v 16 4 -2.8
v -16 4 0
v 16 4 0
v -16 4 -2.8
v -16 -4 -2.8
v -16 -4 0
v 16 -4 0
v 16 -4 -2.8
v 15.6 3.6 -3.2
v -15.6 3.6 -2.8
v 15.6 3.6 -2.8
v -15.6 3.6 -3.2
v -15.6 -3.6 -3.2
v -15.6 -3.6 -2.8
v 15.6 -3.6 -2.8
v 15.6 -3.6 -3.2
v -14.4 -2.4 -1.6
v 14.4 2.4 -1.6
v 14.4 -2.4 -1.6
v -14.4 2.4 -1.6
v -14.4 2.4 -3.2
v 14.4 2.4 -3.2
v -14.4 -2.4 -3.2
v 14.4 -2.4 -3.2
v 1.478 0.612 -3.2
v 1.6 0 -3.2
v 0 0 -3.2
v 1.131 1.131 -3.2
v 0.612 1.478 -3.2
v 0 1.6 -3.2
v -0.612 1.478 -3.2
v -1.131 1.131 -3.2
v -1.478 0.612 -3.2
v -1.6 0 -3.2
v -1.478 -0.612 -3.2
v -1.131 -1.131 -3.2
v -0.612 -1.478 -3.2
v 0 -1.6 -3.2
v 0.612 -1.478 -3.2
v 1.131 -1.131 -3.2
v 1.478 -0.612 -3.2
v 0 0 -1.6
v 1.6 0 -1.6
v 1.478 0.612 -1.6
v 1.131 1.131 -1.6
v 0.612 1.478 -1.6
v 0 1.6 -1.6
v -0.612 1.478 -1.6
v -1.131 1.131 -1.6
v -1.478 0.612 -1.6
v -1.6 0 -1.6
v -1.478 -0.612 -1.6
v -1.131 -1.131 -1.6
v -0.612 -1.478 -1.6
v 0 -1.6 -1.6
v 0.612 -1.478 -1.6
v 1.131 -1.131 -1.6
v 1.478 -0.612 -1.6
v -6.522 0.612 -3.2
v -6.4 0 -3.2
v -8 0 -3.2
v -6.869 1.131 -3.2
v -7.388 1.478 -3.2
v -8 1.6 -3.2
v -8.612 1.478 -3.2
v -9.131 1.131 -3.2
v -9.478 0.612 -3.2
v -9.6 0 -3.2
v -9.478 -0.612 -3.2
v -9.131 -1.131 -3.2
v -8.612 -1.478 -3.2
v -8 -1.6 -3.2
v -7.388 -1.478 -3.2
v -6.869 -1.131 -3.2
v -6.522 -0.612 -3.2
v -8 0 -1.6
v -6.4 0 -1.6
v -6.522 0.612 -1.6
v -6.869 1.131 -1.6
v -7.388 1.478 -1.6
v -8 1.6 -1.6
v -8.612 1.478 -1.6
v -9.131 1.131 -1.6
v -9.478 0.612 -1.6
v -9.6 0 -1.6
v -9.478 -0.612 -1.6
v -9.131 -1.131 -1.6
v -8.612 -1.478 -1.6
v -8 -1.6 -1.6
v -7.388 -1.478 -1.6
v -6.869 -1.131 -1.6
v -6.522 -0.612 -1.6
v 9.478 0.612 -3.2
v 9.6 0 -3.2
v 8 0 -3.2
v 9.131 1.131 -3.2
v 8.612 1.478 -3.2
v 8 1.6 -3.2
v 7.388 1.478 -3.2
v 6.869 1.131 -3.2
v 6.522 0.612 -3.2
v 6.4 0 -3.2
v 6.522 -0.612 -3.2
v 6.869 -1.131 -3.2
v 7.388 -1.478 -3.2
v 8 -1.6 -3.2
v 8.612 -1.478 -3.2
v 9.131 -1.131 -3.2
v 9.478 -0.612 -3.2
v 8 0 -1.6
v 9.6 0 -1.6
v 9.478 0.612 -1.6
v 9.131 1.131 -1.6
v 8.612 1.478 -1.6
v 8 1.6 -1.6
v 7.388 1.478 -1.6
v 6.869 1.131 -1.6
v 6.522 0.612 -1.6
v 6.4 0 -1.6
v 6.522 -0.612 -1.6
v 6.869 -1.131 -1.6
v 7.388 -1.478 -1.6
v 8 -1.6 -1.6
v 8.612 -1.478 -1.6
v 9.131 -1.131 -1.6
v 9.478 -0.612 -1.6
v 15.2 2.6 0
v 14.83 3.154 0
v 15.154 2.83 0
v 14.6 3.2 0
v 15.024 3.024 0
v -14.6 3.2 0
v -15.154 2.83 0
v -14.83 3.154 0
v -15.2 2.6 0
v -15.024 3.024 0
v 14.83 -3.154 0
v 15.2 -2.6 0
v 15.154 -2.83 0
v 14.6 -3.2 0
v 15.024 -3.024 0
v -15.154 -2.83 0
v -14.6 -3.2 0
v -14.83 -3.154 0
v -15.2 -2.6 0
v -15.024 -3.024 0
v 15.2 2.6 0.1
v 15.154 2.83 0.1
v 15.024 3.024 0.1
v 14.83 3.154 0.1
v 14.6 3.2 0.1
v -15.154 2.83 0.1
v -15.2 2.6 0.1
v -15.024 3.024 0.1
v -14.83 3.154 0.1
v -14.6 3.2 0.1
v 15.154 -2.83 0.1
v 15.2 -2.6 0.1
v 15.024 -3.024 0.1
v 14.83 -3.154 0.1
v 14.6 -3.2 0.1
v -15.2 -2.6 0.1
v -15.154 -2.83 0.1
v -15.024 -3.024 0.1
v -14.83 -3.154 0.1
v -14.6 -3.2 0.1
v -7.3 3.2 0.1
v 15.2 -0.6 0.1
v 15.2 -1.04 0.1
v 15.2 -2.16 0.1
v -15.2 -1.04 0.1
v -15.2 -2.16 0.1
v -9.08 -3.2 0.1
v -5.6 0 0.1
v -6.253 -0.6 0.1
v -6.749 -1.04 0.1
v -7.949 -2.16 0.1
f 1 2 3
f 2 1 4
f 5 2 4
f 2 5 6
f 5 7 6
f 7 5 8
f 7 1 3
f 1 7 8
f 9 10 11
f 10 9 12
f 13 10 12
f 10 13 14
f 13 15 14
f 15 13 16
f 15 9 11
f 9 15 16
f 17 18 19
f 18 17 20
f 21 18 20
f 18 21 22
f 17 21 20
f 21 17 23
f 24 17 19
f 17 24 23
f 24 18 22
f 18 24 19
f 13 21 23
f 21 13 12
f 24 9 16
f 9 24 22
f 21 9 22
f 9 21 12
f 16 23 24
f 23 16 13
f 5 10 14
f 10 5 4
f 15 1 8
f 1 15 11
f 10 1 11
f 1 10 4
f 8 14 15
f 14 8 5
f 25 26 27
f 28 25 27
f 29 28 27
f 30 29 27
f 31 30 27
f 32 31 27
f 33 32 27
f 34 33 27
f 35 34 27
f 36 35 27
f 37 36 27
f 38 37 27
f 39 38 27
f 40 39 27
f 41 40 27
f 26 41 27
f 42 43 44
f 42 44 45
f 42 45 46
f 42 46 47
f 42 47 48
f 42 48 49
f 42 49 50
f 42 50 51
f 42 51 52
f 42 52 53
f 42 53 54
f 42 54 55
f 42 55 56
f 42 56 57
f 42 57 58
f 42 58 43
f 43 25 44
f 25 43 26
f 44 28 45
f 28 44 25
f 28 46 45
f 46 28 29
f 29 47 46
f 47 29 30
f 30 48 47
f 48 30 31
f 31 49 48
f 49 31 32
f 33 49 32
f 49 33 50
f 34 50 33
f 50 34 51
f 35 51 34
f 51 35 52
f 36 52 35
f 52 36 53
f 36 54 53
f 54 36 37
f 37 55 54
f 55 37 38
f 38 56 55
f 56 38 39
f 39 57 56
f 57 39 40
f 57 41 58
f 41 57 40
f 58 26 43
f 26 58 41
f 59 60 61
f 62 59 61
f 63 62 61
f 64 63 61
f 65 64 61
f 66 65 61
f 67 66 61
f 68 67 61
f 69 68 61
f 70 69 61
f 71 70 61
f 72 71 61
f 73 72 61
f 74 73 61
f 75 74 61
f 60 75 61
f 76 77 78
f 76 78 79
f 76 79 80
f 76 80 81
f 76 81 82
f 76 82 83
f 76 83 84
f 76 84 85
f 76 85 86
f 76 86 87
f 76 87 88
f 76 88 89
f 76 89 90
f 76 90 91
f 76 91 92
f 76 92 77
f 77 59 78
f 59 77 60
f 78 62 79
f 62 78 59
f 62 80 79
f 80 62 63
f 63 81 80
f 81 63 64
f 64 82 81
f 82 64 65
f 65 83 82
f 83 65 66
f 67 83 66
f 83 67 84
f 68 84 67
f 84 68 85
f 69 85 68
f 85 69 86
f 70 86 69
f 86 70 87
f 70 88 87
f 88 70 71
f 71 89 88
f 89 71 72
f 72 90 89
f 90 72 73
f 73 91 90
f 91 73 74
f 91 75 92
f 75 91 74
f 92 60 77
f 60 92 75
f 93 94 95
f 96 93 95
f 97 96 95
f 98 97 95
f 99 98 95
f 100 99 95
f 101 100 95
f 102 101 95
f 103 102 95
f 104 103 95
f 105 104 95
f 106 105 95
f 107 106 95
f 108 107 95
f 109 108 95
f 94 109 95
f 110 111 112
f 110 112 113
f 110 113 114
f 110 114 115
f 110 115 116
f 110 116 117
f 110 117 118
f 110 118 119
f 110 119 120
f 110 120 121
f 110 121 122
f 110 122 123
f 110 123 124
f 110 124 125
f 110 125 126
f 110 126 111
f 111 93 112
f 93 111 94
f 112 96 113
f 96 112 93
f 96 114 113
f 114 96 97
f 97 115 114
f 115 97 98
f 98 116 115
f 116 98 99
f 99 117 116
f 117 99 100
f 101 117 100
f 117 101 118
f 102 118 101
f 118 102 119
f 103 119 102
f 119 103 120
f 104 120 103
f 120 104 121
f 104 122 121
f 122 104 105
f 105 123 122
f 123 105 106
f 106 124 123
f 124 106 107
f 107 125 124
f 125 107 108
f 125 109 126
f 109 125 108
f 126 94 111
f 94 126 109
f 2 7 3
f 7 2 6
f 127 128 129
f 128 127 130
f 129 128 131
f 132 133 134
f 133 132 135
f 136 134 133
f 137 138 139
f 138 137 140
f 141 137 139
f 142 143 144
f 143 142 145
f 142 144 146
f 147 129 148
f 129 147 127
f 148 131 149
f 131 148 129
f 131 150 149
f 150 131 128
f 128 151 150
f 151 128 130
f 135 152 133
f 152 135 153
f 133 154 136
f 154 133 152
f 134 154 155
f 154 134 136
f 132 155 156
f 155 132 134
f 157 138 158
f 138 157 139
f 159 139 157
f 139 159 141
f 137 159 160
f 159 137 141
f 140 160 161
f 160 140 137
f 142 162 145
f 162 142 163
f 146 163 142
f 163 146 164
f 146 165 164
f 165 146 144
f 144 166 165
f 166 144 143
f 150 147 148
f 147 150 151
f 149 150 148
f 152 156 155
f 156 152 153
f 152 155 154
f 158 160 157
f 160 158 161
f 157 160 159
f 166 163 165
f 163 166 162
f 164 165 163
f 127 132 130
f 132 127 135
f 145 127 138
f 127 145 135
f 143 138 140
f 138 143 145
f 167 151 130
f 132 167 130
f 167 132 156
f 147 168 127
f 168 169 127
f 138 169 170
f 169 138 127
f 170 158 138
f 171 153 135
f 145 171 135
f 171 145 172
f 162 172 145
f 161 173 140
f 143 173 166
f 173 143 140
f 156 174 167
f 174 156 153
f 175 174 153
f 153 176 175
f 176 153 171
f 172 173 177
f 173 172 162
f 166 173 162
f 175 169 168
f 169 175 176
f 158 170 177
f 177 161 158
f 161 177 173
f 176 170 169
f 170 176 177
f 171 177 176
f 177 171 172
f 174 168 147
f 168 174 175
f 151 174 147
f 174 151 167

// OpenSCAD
// file: ../p/4-4edge.scad
use <../lib.scad>
function ldraw_lib__4_4edge() = [
// 0 Circle 1.0
// 0 Name: 4-4edge.dat
// 0 Author: James Jessiman
// 0 !LDRAW_ORG Primitive UPDATE 2017-01
// 0 !LICENSE Licensed under CC BY 2.0 and CC BY 4.0 : see CAreadme.txt
// 
// 0 BFC CERTIFY CCW
  [0,"BFC","CERTIFY"],
  [0,"BFC","CCW"],
// 
// 0 !HISTORY 1998-12-15 [PTadmin] Official Update 1998-10
// 0 !HISTORY 2005-12-28 [PTadmin] Official Update 2005-01
// 0 !HISTORY 2007-06-24 [PTadmin] Header formatted for Contributor Agreement
// 0 !HISTORY 2008-07-01 [PTadmin] Official Update 2008-01
// 0 !HISTORY 2017-01-15 [Steffen] BFCed
// 0 !HISTORY 2017-12-30 [PTadmin] Official Update 2017-01
// 
// 
// 2 24 1 0 0 0.9239 0 0.3827
  [2,24,1,0,0,0.9239,0,0.3827],
// 2 24 0.9239 0 0.3827 0.7071 0 0.7071
  [2,24,0.9239,0,0.3827,0.7071,0,0.7071],
// 2 24 0.7071 0 0.7071 0.3827 0 0.9239
  [2,24,0.7071,0,0.7071,0.3827,0,0.9239],
// 2 24 0.3827 0 0.9239 0 0 1
  [2,24,0.3827,0,0.9239,0,0,1],
// 2 24 0 0 1 -0.3827 0 0.9239
  [2,24,0,0,1,-0.3827,0,0.9239],
// 2 24 -0.3827 0 0.9239 -0.7071 0 0.7071
  [2,24,-0.3827,0,0.9239,-0.7071,0,0.7071],
// 2 24 -0.7071 0 0.7071 -0.9239 0 0.3827
  [2,24,-0.7071,0,0.7071,-0.9239,0,0.3827],
// 2 24 -0.9239 0 0.3827 -1 0 -0
  [2,24,-0.9239,0,0.3827,-1,0,-0],
// 2 24 -1 0 -0 -0.9239 0 -0.3827
  [2,24,-1,0,-0,-0.9239,0,-0.3827],
// 2 24 -0.9239 0 -0.3827 -0.7071 0 -0.7071
  [2,24,-0.9239,0,-0.3827,-0.7071,0,-0.7071],
// 2 24 -0.7071 0 -0.7071 -0.3827 0 -0.9239
  [2,24,-0.7071,0,-0.7071,-0.3827,0,-0.9239],
// 2 24 -0.3827 0 -0.9239 0 0 -1
  [2,24,-0.3827,0,-0.9239,0,0,-1],
// 2 24 0 0 -1 0.3827 0 -0.9239
  [2,24,0,0,-1,0.3827,0,-0.9239],
// 2 24 0.3827 0 -0.9239 0.7071 0 -0.7071
  [2,24,0.3827,0,-0.9239,0.7071,0,-0.7071],
// 2 24 0.7071 0 -0.7071 0.9239 0 -0.3827
  [2,24,0.7071,0,-0.7071,0.9239,0,-0.3827],
// 2 24 0.9239 0 -0.3827 1 0 0
  [2,24,0.9239,0,-0.3827,1,0,0],
];
module ldraw_lib__4_4edge(step=0, col=false, unit=2/5, alt=false, line=0.2, solid=!$preview)
    makepoly(ldraw_lib__4_4edge(), step=step, col=col, unit=unit, alt=alt, line=line, solid=solid);
ldraw_lib__4_4edge(line=0.2);
// file: ../p/4-4disc.scad
use <../lib.scad>
function ldraw_lib__4_4disc() = [
// 0 Disc 1.0
// 0 Name: 4-4disc.dat
// 0 Author: James Jessiman
// 0 !LDRAW_ORG Primitive UPDATE 2002-02
// 0 !LICENSE Licensed under CC BY 2.0 and CC BY 4.0 : see CAreadme.txt
// 
// 0 BFC CERTIFY CCW
  [0,"BFC","CERTIFY"],
  [0,"BFC","CCW"],
// 
// 0 !HISTORY 1998-12-15 [PTadmin] Official Update 1998-10
// 0 !HISTORY 2002-03-23 [sbliss] Added BFC statement
// 0 !HISTORY 2002-04-25 [PTadmin] Official Update 2002-02
// 0 !HISTORY 2007-06-24 [PTadmin] Header formatted for Contributor Agreement
// 0 !HISTORY 2008-07-01 [PTadmin] Official Update 2008-01
// 
// 
// 3 16 0 0 0 1 0 0 0.9239 0 0.3827
  [3,16,0,0,0,1,0,0,0.9239,0,0.3827],
// 3 16 0 0 0 0.9239 0 0.3827 0.7071 0 0.7071
  [3,16,0,0,0,0.9239,0,0.3827,0.7071,0,0.7071],
// 3 16 0 0 0 0.7071 0 0.7071 0.3827 0 0.9239
  [3,16,0,0,0,0.7071,0,0.7071,0.3827,0,0.9239],
// 3 16 0 0 0 0.3827 0 0.9239 0 0 1
  [3,16,0,0,0,0.3827,0,0.9239,0,0,1],
// 3 16 0 0 0 0 0 1 -0.3827 0 0.9239
  [3,16,0,0,0,0,0,1,-0.3827,0,0.9239],
// 3 16 0 0 0 -0.3827 0 0.9239 -0.7071 0 0.7071
  [3,16,0,0,0,-0.3827,0,0.9239,-0.7071,0,0.7071],
// 3 16 0 0 0 -0.7071 0 0.7071 -0.9239 0 0.3827
  [3,16,0,0,0,-0.7071,0,0.7071,-0.9239,0,0.3827],
// 3 16 0 0 0 -0.9239 0 0.3827 -1 0 -0
  [3,16,0,0,0,-0.9239,0,0.3827,-1,0,-0],
// 3 16 0 0 0 -1 0 -0 -0.9239 0 -0.3827
  [3,16,0,0,0,-1,0,-0,-0.9239,0,-0.3827],
// 3 16 0 0 0 -0.9239 0 -0.3827 -0.7071 0 -0.7071
  [3,16,0,0,0,-0.9239,0,-0.3827,-0.7071,0,-0.7071],
// 3 16 0 0 0 -0.7071 0 -0.7071 -0.3827 0 -0.9239
  [3,16,0,0,0,-0.7071,0,-0.7071,-0.3827,0,-0.9239],
// 3 16 0 0 0 -0.3827 0 -0.9239 0 0 -1
  [3,16,0,0,0,-0.3827,0,-0.9239,0,0,-1],
// 3 16 0 0 0 0 0 -1 0.3827 0 -0.9239
  [3,16,0,0,0,0,0,-1,0.3827,0,-0.9239],
// 3 16 0 0 0 0.3827 0 -0.9239 0.7071 0 -0.7071
  [3,16,0,0,0,0.3827,0,-0.9239,0.7071,0,-0.7071],
// 3 16 0 0 0 0.7071 0 -0.7071 0.9239 0 -0.3827
  [3,16,0,0,0,0.7071,0,-0.7071,0.9239,0,-0.3827],
// 3 16 0 0 0 0.9239 0 -0.3827 1 0 0
  [3,16,0,0,0,0.9239,0,-0.3827,1,0,0],
// 0
];
module ldraw_lib__4_4disc(step=0, col=false, unit=2/5, alt=false, line=0.2, solid=!$preview)
    makepoly(ldraw_lib__4_4disc(), step=step, col=col, unit=unit, alt=alt, line=line, solid=solid);
ldraw_lib__4_4disc(line=0.2);
// file: ../p/4-4cyli.scad
use <../lib.scad>
$fa=1; $fs=0.2;
function ldraw_lib__4_4cyli(realsolid=false) = [
// 0 Cylinder 1.0
// 0 Name: 4-4cyli.dat
// 0 Author: James Jessiman
// 0 !LDRAW_ORG Primitive UPDATE 2005-01
// 0 !LICENSE Licensed under CC BY 2.0 and CC BY 4.0 : see CAreadme.txt
// 
// 0 BFC CERTIFY CCW
  [0,"BFC","CERTIFY"],
  [0,"BFC","CCW"],
// 
// 0 !HISTORY 1998-12-15 [PTadmin] Official Update 1998-10
// 0 !HISTORY 2002-03-23 [sbliss] Added BFC statement; merged headers from files in distributions LDraw 0.27 and Complete.
// 0 !HISTORY 2002-04-25 [PTadmin] Official Update 2002-02
// 0 !HISTORY 2004-12-14 [guyvivan] BFC CCW
// 0 !HISTORY 2005-12-28 [PTadmin] Official Update 2005-01
// 0 !HISTORY 2007-06-24 [PTadmin] Header formatted for Contributor Agreement
// 0 !HISTORY 2008-07-01 [PTadmin] Official Update 2008-01
// 
// 
// 4 16 1 1 0 0.9239 1 0.3827 0.9239 0 0.3827 1 0 0
  [4,16,1,1,0,0.9239,1,0.3827,0.9239,0,0.3827,1,0,0],
// 5 24 1 0 0 1 1 0 0.9239 0 0.3827 0.9239 0 -0.3827
  [5,24,1,0,0,1,1,0,0.9239,0,0.3827,0.9239,0,-0.3827],
// 4 16 0.9239 1 0.3827 0.7071 1 0.7071 0.7071 0 0.7071 0.9239 0 0.3827
  [4,16,0.9239,1,0.3827,0.7071,1,0.7071,0.7071,0,0.7071,0.9239,0,0.3827],
// 5 24 0.9239 0 0.3827 0.9239 1 0.3827 0.7071 0 0.7071 1 0 0
  [5,24,0.9239,0,0.3827,0.9239,1,0.3827,0.7071,0,0.7071,1,0,0],
// 4 16 0.7071 1 0.7071 0.3827 1 0.9239 0.3827 0 0.9239 0.7071 0 0.7071
  [4,16,0.7071,1,0.7071,0.3827,1,0.9239,0.3827,0,0.9239,0.7071,0,0.7071],
// 5 24 0.7071 0 0.7071 0.7071 1 0.7071 0.3827 0 0.9239 0.9239 0 0.3827
  [5,24,0.7071,0,0.7071,0.7071,1,0.7071,0.3827,0,0.9239,0.9239,0,0.3827],
// 4 16 0.3827 1 0.9239 0 1 1 0 0 1 0.3827 0 0.9239
  [4,16,0.3827,1,0.9239,0,1,1,0,0,1,0.3827,0,0.9239],
// 5 24 0.3827 0 0.9239 0.3827 1 0.9239 0 0 1 0.7071 0 0.7071
  [5,24,0.3827,0,0.9239,0.3827,1,0.9239,0,0,1,0.7071,0,0.7071],
// 4 16 0 1 1 -0.3827 1 0.9239 -0.3827 0 0.9239 0 0 1
  [4,16,0,1,1,-0.3827,1,0.9239,-0.3827,0,0.9239,0,0,1],
// 5 24 0 0 1 0 1 1 -0.3827 0 0.9239 0.3827 0 0.9239
  [5,24,0,0,1,0,1,1,-0.3827,0,0.9239,0.3827,0,0.9239],
// 4 16 -0.3827 1 0.9239 -0.7071 1 0.7071 -0.7071 0 0.7071 -0.3827 0 0.9239
  [4,16,-0.3827,1,0.9239,-0.7071,1,0.7071,-0.7071,0,0.7071,-0.3827,0,0.9239],
// 5 24 -0.3827 0 0.9239 -0.3827 1 0.9239 -0.7071 0 0.7071 0 0 1
  [5,24,-0.3827,0,0.9239,-0.3827,1,0.9239,-0.7071,0,0.7071,0,0,1],
// 4 16 -0.7071 1 0.7071 -0.9239 1 0.3827 -0.9239 0 0.3827 -0.7071 0 0.7071
  [4,16,-0.7071,1,0.7071,-0.9239,1,0.3827,-0.9239,0,0.3827,-0.7071,0,0.7071],
// 5 24 -0.7071 0 0.7071 -0.7071 1 0.7071 -0.9239 0 0.3827 -0.3827 0 0.9239
  [5,24,-0.7071,0,0.7071,-0.7071,1,0.7071,-0.9239,0,0.3827,-0.3827,0,0.9239],
// 4 16 -0.9239 1 0.3827 -1 1 0 -1 0 0 -0.9239 0 0.3827
  [4,16,-0.9239,1,0.3827,-1,1,0,-1,0,0,-0.9239,0,0.3827],
// 5 24 -0.9239 0 0.3827 -0.9239 1 0.3827 -1 0 0 -0.7071 0 0.7071
  [5,24,-0.9239,0,0.3827,-0.9239,1,0.3827,-1,0,0,-0.7071,0,0.7071],
// 4 16 -1 1 0 -0.9239 1 -0.3827 -0.9239 0 -0.3827 -1 0 0
  [4,16,-1,1,0,-0.9239,1,-0.3827,-0.9239,0,-0.3827,-1,0,0],
// 5 24 -1 0 0 -1 1 0 -0.9239 0 -0.3827 -0.9239 0 0.3827
  [5,24,-1,0,0,-1,1,0,-0.9239,0,-0.3827,-0.9239,0,0.3827],
// 4 16 -0.9239 1 -0.3827 -0.7071 1 -0.7071 -0.7071 0 -0.7071 -0.9239 0 -0.3827
  [4,16,-0.9239,1,-0.3827,-0.7071,1,-0.7071,-0.7071,0,-0.7071,-0.9239,0,-0.3827],
// 5 24 -0.9239 0 -0.3827 -0.9239 1 -0.3827 -0.7071 0 -0.7071 -1 0 0
  [5,24,-0.9239,0,-0.3827,-0.9239,1,-0.3827,-0.7071,0,-0.7071,-1,0,0],
// 4 16 -0.7071 1 -0.7071 -0.3827 1 -0.9239 -0.3827 0 -0.9239 -0.7071 0 -0.7071
  [4,16,-0.7071,1,-0.7071,-0.3827,1,-0.9239,-0.3827,0,-0.9239,-0.7071,0,-0.7071],
// 5 24 -0.7071 0 -0.7071 -0.7071 1 -0.7071 -0.3827 0 -0.9239 -0.9239 0 -0.3827
  [5,24,-0.7071,0,-0.7071,-0.7071,1,-0.7071,-0.3827,0,-0.9239,-0.9239,0,-0.3827],
// 4 16 -0.3827 1 -0.9239 0 1 -1 0 0 -1 -0.3827 0 -0.9239
  [4,16,-0.3827,1,-0.9239,0,1,-1,0,0,-1,-0.3827,0,-0.9239],
// 5 24 -0.3827 0 -0.9239 -0.3827 1 -0.9239 0 0 -1 -0.7071 0 -0.7071
  [5,24,-0.3827,0,-0.9239,-0.3827,1,-0.9239,0,0,-1,-0.7071,0,-0.7071],
// 4 16 0 1 -1 0.3827 1 -0.9239 0.3827 0 -0.9239 0 0 -1
  [4,16,0,1,-1,0.3827,1,-0.9239,0.3827,0,-0.9239,0,0,-1],
// 5 24 0 0 -1 0 1 -1 0.3827 0 -0.9239 -0.3827 0 -0.9239
  [5,24,0,0,-1,0,1,-1,0.3827,0,-0.9239,-0.3827,0,-0.9239],
// 4 16 0.3827 1 -0.9239 0.7071 1 -0.7071 0.7071 0 -0.7071 0.3827 0 -0.9239
  [4,16,0.3827,1,-0.9239,0.7071,1,-0.7071,0.7071,0,-0.7071,0.3827,0,-0.9239],
// 5 24 0.3827 0 -0.9239 0.3827 1 -0.9239 0.7071 0 -0.7071 0 0 -1
  [5,24,0.3827,0,-0.9239,0.3827,1,-0.9239,0.7071,0,-0.7071,0,0,-1],
// 4 16 0.7071 1 -0.7071 0.9239 1 -0.3827 0.9239 0 -0.3827 0.7071 0 -0.7071
  [4,16,0.7071,1,-0.7071,0.9239,1,-0.3827,0.9239,0,-0.3827,0.7071,0,-0.7071],
// 5 24 0.7071 0 -0.7071 0.7071 1 -0.7071 0.9239 0 -0.3827 0.3827 0 -0.9239
  [5,24,0.7071,0,-0.7071,0.7071,1,-0.7071,0.9239,0,-0.3827,0.3827,0,-0.9239],
// 4 16 0.9239 1 -0.3827 1 1 0 1 0 0 0.9239 0 -0.3827
  [4,16,0.9239,1,-0.3827,1,1,0,1,0,0,0.9239,0,-0.3827],
// 5 24 0.9239 0 -0.3827 0.9239 1 -0.3827 1 0 0 0.7071 0 -0.7071
  [5,24,0.9239,0,-0.3827,0.9239,1,-0.3827,1,0,0,0.7071,0,-0.7071],
// 0
];
module ldraw_lib__4_4cyli(step=0, col=false, unit=2/5, alt=false, line=0.2, solid=!$preview)
    makepoly(ldraw_lib__4_4cyli(solid), step=step, col=col, unit=unit, alt=alt, line=line, solid=solid);
ldraw_lib__4_4cyli(line=0.2);
// file: ../p/1-4cyli.scad
use <../lib.scad>
function ldraw_lib__1_4cyli() = [
// 0 Cylinder 0.25
// 0 Name: 1-4cyli.dat
// 0 Author: James Jessiman
// 0 !LDRAW_ORG Primitive UPDATE 2012-01
// 0 !LICENSE Licensed under CC BY 2.0 and CC BY 4.0 : see CAreadme.txt
// 
// 0 BFC CERTIFY CCW
  [0,"BFC","CERTIFY"],
  [0,"BFC","CCW"],
// 
// 0 !HISTORY 2002-03-23 [sbliss] Added BFC statement.
// 0 !HISTORY 2002-04-25 [PTadmin] Official Update 2002-02
// 0 !HISTORY 2007-06-22 [PTadmin] Header formatted for Contributor Agreement
// 0 !HISTORY 2008-07-01 [PTadmin] Official Update 2008-01
// 0 !HISTORY 2012-02-16 [Philo] Changed to CCW
// 0 !HISTORY 2012-03-30 [PTadmin] Official Update 2012-01
// 
// 
// 4 16 1 1 0 0.9239 1 0.3827 0.9239 0 0.3827 1 0 0
  [4,16,1,1,0,0.9239,1,0.3827,0.9239,0,0.3827,1,0,0],
// 5 24 1 0 0 1 1 0 0.9239 0 0.3827 1 0 -1
  [5,24,1,0,0,1,1,0,0.9239,0,0.3827,1,0,-1],
// 4 16 0.9239 1 0.3827 0.7071 1 0.7071 0.7071 0 0.7071 0.9239 0 0.3827
  [4,16,0.9239,1,0.3827,0.7071,1,0.7071,0.7071,0,0.7071,0.9239,0,0.3827],
// 5 24 0.9239 0 0.3827 0.9239 1 0.3827 0.7071 0 0.7071 1 0 0
  [5,24,0.9239,0,0.3827,0.9239,1,0.3827,0.7071,0,0.7071,1,0,0],
// 4 16 0.7071 1 0.7071 0.3827 1 0.9239 0.3827 0 0.9239 0.7071 0 0.7071
  [4,16,0.7071,1,0.7071,0.3827,1,0.9239,0.3827,0,0.9239,0.7071,0,0.7071],
// 5 24 0.7071 0 0.7071 0.7071 1 0.7071 0.3827 0 0.9239 0.9239 0 0.3827
  [5,24,0.7071,0,0.7071,0.7071,1,0.7071,0.3827,0,0.9239,0.9239,0,0.3827],
// 4 16 0.3827 1 0.9239 0 1 1 0 0 1 0.3827 0 0.9239
  [4,16,0.3827,1,0.9239,0,1,1,0,0,1,0.3827,0,0.9239],
// 5 24 0.3827 0 0.9239 0.3827 1 0.9239 0 0 1 0.7071 0 0.7071
  [5,24,0.3827,0,0.9239,0.3827,1,0.9239,0,0,1,0.7071,0,0.7071],
// 5 24 0 0 1 0 1 1 0.3827 0 0.9239 -1 0 1
  [5,24,0,0,1,0,1,1,0.3827,0,0.9239,-1,0,1],
];
module ldraw_lib__1_4cyli(step=0, col=false, unit=2/5, alt=false, line=0.2, solid=!$preview)
    makepoly(ldraw_lib__1_4cyli(), step=step, col=col, unit=unit, alt=alt, line=line, solid=solid);
ldraw_lib__1_4cyli(line=0.2);
// file: ../p/1-4chrd.scad
use <../lib.scad>
$fa=1; $fs=0.2;
function ldraw_lib__1_4chrd(realsolid=false) = [
// 0 Chord 0.25
// 0 Name: 1-4chrd.dat
// 0 Author: Tony Hafner [hafhead]
// 0 !LDRAW_ORG Primitive UPDATE 2012-02
// 0 !LICENSE Licensed under CC BY 2.0 and CC BY 4.0 : see CAreadme.txt
// 
// 0 BFC CERTIFY CCW
  [0,"BFC","CERTIFY"],
  [0,"BFC","CCW"],
// 
// 0 !HISTORY 2004-04-22 [PTadmin] Official Update 2004-02
// 0 !HISTORY 2007-10-09 [PTadmin] Header formatted for Contributor Agreement
// 0 !HISTORY 2008-07-01 [PTadmin] Official Update 2008-01
// 0 !HISTORY 2012-08-02 [MMR1988] Re-creation with PrimGen2 and Rectifier
// 0 !HISTORY 2012-08-09 [PTadmin] Official Update 2012-02
// 
// 
// 4 16 0.9239 0 0.3827 0.3827 0 0.9239 0 0 1 1 0 0
  [4,16,0.9239,0,0.3827,0.3827,0,0.9239,0,0,1,1,0,0],
// 3 16 0.7071 0 0.7071 0.3827 0 0.9239 0.9239 0 0.3827
  [3,16,0.7071,0,0.7071,0.3827,0,0.9239,0.9239,0,0.3827],
];
module ldraw_lib__1_4chrd(step=0, col=false, unit=2/5, alt=false, line=0.2, solid=!$preview)
    makepoly(ldraw_lib__1_4chrd(solid), step=step, col=col, unit=unit, alt=alt, line=line, solid=solid);
ldraw_lib__1_4chrd(line=0.2);
// file: ../p/stud3.scad
use <../lib.scad>
use <4-4cyli.scad>
use <4-4disc.scad>
use <4-4edge.scad>
function ldraw_lib__stud3() = [
// 0 Stud Tube Solid
// 0 Name: stud3.dat
// 0 Author: James Jessiman
// 0 !LDRAW_ORG Primitive UPDATE 2012-01
// 0 !LICENSE Licensed under CC BY 4.0 : see CAreadme.txt
// 
// 0 BFC CERTIFY CCW
  [0,"BFC","CERTIFY"],
  [0,"BFC","CCW"],
// 
// 0 !HISTORY 2002-04-04 [sbliss] Modified for BFC compliance
// 0 !HISTORY 2002-04-25 [PTadmin] Official Update 2002-02
// 0 !HISTORY 2007-06-24 [PTadmin] Header formatted for Contributor Agreement
// 0 !HISTORY 2008-07-01 [PTadmin] Official Update 2008-01
// 0 !HISTORY 2012-02-16 [Philo] Changed to CCW
// 0 !HISTORY 2012-03-30 [PTadmin] Official Update 2012-01
// 
// 
// 1 16 0 -4 0 4 0 0 0 1 0 0 0 4 4-4edge.dat
  [1,16,0,-4,0,4,0,0,0,1,0,0,0,4, ldraw_lib__4_4edge()],
// 1 16 0 0 0 4 0 0 0 1 0 0 0 4 4-4edge.dat
  [1,16,0,0,0,4,0,0,0,1,0,0,0,4, ldraw_lib__4_4edge()],
// 1 16 0 -4 0 4 0 0 0 1 0 0 0 4 4-4disc.dat
  [1,16,0,-4,0,4,0,0,0,1,0,0,0,4, ldraw_lib__4_4disc()],
  [-1,16,0,0,0,4,0,0,0,-1,0,0,0,4, ldraw_lib__4_4disc()],
// 1 16 0 -4 0 4 0 0 0 4 0 0 0 4 4-4cyli.dat
  [1,16,0,-4,0,4,0,0,0,4,0,0,0,4, ldraw_lib__4_4cyli()],
];
module ldraw_lib__stud3(step=0, col=false, unit=2/5, alt=false, line=0.2, solid=!$preview)
    makepoly(ldraw_lib__stud3(), step=step, col=col, unit=unit, alt=alt, line=line, solid=solid);
ldraw_lib__stud3(line=0.2);
// file: ../p/box5.scad
use <../lib.scad>
function ldraw_lib__box5() = [
// 0 Box with 5 Faces and All Edges
// 0 Name: box5.dat
// 0 Author: James Jessiman
// 0 !LDRAW_ORG Primitive UPDATE 2012-01
// 0 !LICENSE Licensed under CC BY 2.0 and CC BY 4.0 : see CAreadme.txt
// 
// 0 BFC CERTIFY CCW
  [0,"BFC","CERTIFY"],
  [0,"BFC","CCW"],
// 
// 0 !HISTORY 2002-04-03 [sbliss] Modified for BFC compliance
// 0 !HISTORY 2002-04-25 [PTadmin] Official Update 2002-02
// 0 !HISTORY 2007-06-24 [PTadmin] Header formatted for Contributor Agreement
// 0 !HISTORY 2008-07-01 [PTadmin] Official Update 2008-01
// 0 !HISTORY 2012-02-16 [Philo] Changed to CCW
// 0 !HISTORY 2012-03-30 [PTadmin] Official Update 2012-01
// 
// 
// 2 24 1 1 1 -1 1 1
  [2,24,1,1,1,-1,1,1],
// 2 24 -1 1 1 -1 1 -1
  [2,24,-1,1,1,-1,1,-1],
// 2 24 -1 1 -1 1 1 -1
  [2,24,-1,1,-1,1,1,-1],
// 2 24 1 1 -1 1 1 1
  [2,24,1,1,-1,1,1,1],
// 2 24 1 0 1 -1 0 1
  [2,24,1,0,1,-1,0,1],
// 2 24 -1 0 1 -1 0 -1
  [2,24,-1,0,1,-1,0,-1],
// 2 24 -1 0 -1 1 0 -1
  [2,24,-1,0,-1,1,0,-1],
// 2 24 1 0 -1 1 0 1
  [2,24,1,0,-1,1,0,1],
// 2 24 1 0 1 1 1 1
  [2,24,1,0,1,1,1,1],
// 2 24 -1 0 1 -1 1 1
  [2,24,-1,0,1,-1,1,1],
// 2 24 1 0 -1 1 1 -1
  [2,24,1,0,-1,1,1,-1],
// 2 24 -1 0 -1 -1 1 -1
  [2,24,-1,0,-1,-1,1,-1],
// 4 16 -1 1 1 1 1 1 1 1 -1 -1 1 -1
  [4,16,-1,1,1,1,1,1,1,1,-1,-1,1,-1],
// 4 16 -1 1 1 -1 0 1 1 0 1 1 1 1
  [4,16,-1,1,1,-1,0,1,1,0,1,1,1,1],
// 4 16 -1 1 -1 -1 0 -1 -1 0 1 -1 1 1
  [4,16,-1,1,-1,-1,0,-1,-1,0,1,-1,1,1],
// 4 16 1 1 -1 1 0 -1 -1 0 -1 -1 1 -1
  [4,16,1,1,-1,1,0,-1,-1,0,-1,-1,1,-1],
// 4 16 1 1 1 1 0 1 1 0 -1 1 1 -1
  [4,16,1,1,1,1,0,1,1,0,-1,1,1,-1],
];
makepoly(ldraw_lib__box5(), line=0.2);
// file: ../p/box4.scad
use <../lib.scad>
function ldraw_lib__box4() = [
// 0 Box with 4 Faces (2 Parallel Pairs) and All Edges
// 0 Name: box4.dat
// 0 Author: James Jessiman
// 0 !LDRAW_ORG Primitive UPDATE 2012-01
// 0 !LICENSE Licensed under CC BY 4.0 : see CAreadme.txt
// 
// 0 BFC CERTIFY CCW
  [0,"BFC","CERTIFY"],
  [0,"BFC","CCW"],
// 
// 0 !HISTORY 2002-04-03 [sbliss] Modified for BFC compliance
// 0 !HISTORY 2002-04-25 [PTadmin] Official Update 2002-02
// 0 !HISTORY 2007-06-24 [PTadmin] Header formatted for Contributor Agreement
// 0 !HISTORY 2008-07-01 [PTadmin] Official Update 2008-01
// 0 !HISTORY 2012-02-16 [Philo] Changed to CCW
// 0 !HISTORY 2012-03-30 [PTadmin] Official Update 2012-01
// 
// 
// 2 24 1 1 1 -1 1 1
  [2,24,1,1,1,-1,1,1],
// 2 24 -1 1 1 -1 1 -1
  [2,24,-1,1,1,-1,1,-1],
// 2 24 -1 1 -1 1 1 -1
  [2,24,-1,1,-1,1,1,-1],
// 2 24 1 1 -1 1 1 1
  [2,24,1,1,-1,1,1,1],
// 2 24 1 0 1 -1 0 1
  [2,24,1,0,1,-1,0,1],
// 2 24 -1 0 1 -1 0 -1
  [2,24,-1,0,1,-1,0,-1],
// 2 24 -1 0 -1 1 0 -1
  [2,24,-1,0,-1,1,0,-1],
// 2 24 1 0 -1 1 0 1
  [2,24,1,0,-1,1,0,1],
// 2 24 1 0 1 1 1 1
  [2,24,1,0,1,1,1,1],
// 2 24 -1 0 1 -1 1 1
  [2,24,-1,0,1,-1,1,1],
// 2 24 1 0 -1 1 1 -1
  [2,24,1,0,-1,1,1,-1],
// 2 24 -1 0 -1 -1 1 -1
  [2,24,-1,0,-1,-1,1,-1],
// 4 16 -1 1 1 -1 0 1 1 0 1 1 1 1
  [4,16,-1,1,1,-1,0,1,1,0,1,1,1,1],
// 4 16 -1 1 -1 -1 0 -1 -1 0 1 -1 1 1
  [4,16,-1,1,-1,-1,0,-1,-1,0,1,-1,1,1],
// 4 16 1 1 -1 1 0 -1 -1 0 -1 -1 1 -1
  [4,16,1,1,-1,1,0,-1,-1,0,-1,-1,1,-1],
// 4 16 1 1 1 1 0 1 1 0 -1 1 1 -1
  [4,16,1,1,1,1,0,1,1,0,-1,1,1,-1],
];
module ldraw_lib__box4(step=0, col=false, unit=2/5, alt=false, line=0.2, solid=!$preview)
    makepoly(ldraw_lib__box4(), step=step, col=col, unit=unit, alt=alt, line=line, solid=solid);
ldraw_lib__box4(line=0.2);
// file: 6142275f.scad
use <../lib.scad>
use <../p/1-4chrd.scad>
use <../p/1-4cyli.scad>
function ldraw_lib__6142275f() = [
// 0 Sticker  0.8 x  3.8 with Red Line on Black, Grey and White Background Right
// 0 Name: 6142275f.dat
// 0 Author: Massimo Maso [Sirio]
// 0 !LDRAW_ORG Part UPDATE 2022-06
// 0 !LICENSE Licensed under CC BY 2.0 and CC BY 4.0 : see CAreadme.txt
// 
// 0 BFC CERTIFY CCW
  [0,"BFC","CERTIFY"],
  [0,"BFC","CCW"],
// 
// 0 !KEYWORDS Audi, e-tron, quattro, R18, Set 75872, Speed Champions
// 
// 0 !HISTORY 2022-12-20 [PTadmin] Official Update 2022-06
// 
// 
// 0 // Primitives
// 1 16 -36.5 0 6.5 -1.5 0 0 0 -1 0 0 0 1.5 1-4chrd.dat
  [1,16,-36.5,0,6.5,-1.5,0,0,0,-1,0,0,0,1.5, ldraw_lib__1_4chrd()],
// 1 16 36.5 0 6.5 1.5 0 0 0 -1 0 0 0 1.5 1-4chrd.dat
  [1,16,36.5,0,6.5,1.5,0,0,0,-1,0,0,0,1.5, ldraw_lib__1_4chrd()],
// 1 16 -36.5 0 -6.5 -1.5 0 0 0 -1 0 0 0 -1.5 1-4chrd.dat
  [1,16,-36.5,0,-6.5,-1.5,0,0,0,-1,0,0,0,-1.5, ldraw_lib__1_4chrd()],
// 1 16 36.5 0 -6.5 1.5 0 0 0 -1 0 0 0 -1.5 1-4chrd.dat
  [1,16,36.5,0,-6.5,1.5,0,0,0,-1,0,0,0,-1.5, ldraw_lib__1_4chrd()],
// 1 16 -36.5 0 6.5 -1.5 0 0 0 -.25 0 0 0 1.5 1-4cyli.dat
  [1,16,-36.5,0,6.5,-1.5,0,0,0,-.25,0,0,0,1.5, ldraw_lib__1_4cyli()],
// 1 16 36.5 0 6.5 1.5 0 0 0 -.25 0 0 0 1.5 1-4cyli.dat
  [1,16,36.5,0,6.5,1.5,0,0,0,-.25,0,0,0,1.5, ldraw_lib__1_4cyli()],
// 1 16 -36.5 0 -6.5 -1.5 0 0 0 -.25 0 0 0 -1.5 1-4cyli.dat
  [1,16,-36.5,0,-6.5,-1.5,0,0,0,-.25,0,0,0,-1.5, ldraw_lib__1_4cyli()],
// 1 16 36.5 0 -6.5 1.5 0 0 0 -.25 0 0 0 -1.5 1-4cyli.dat
  [1,16,36.5,0,-6.5,1.5,0,0,0,-.25,0,0,0,-1.5, ldraw_lib__1_4cyli()],
// 1 15 -36.5 -.25 6.5 -1.5 0 0 0 1 0 0 0 1.5 1-4chrd.dat
  [1,15,-36.5,-.25,6.5,-1.5,0,0,0,1,0,0,0,1.5, ldraw_lib__1_4chrd()],
// 1 0 36.5 -.25 6.5 1.5 0 0 0 1 0 0 0 1.5 1-4chrd.dat
  [1,0,36.5,-.25,6.5,1.5,0,0,0,1,0,0,0,1.5, ldraw_lib__1_4chrd()],
// 1 71 -36.5 -.25 -6.5 -1.5 0 0 0 1 0 0 0 -1.5 1-4chrd.dat
  [1,71,-36.5,-.25,-6.5,-1.5,0,0,0,1,0,0,0,-1.5, ldraw_lib__1_4chrd()],
// 1 0 36.5 -.25 -6.5 1.5 0 0 0 1 0 0 0 -1.5 1-4chrd.dat
  [1,0,36.5,-.25,-6.5,1.5,0,0,0,1,0,0,0,-1.5, ldraw_lib__1_4chrd()],
// 0 // Bottom faces
// 4 16 36.5 0 8 38 0 6.5 -38 0 6.5 -36.5 0 8
  [4,16,36.5,0,8,38,0,6.5,-38,0,6.5,-36.5,0,8],
// 4 16 38 0 6.5 38 0 -6.5 -38 0 -6.5 -38 0 6.5
  [4,16,38,0,6.5,38,0,-6.5,-38,0,-6.5,-38,0,6.5],
// 4 16 36.5 0 -8 -36.5 0 -8 -38 0 -6.5 38 0 -6.5
  [4,16,36.5,0,-8,-36.5,0,-8,-38,0,-6.5,38,0,-6.5],
// 0 // Lateral faces
// 3 16 -36.5 0 8 -36.5 -.25 8 18.25 -.25 8
  [3,16,-36.5,0,8,-36.5,-.25,8,18.25,-.25,8],
// 4 16 -36.5 0 8 18.25 -.25 8 36.5 -.25 8 36.5 0 8
  [4,16,-36.5,0,8,18.25,-.25,8,36.5,-.25,8,36.5,0,8],
// 3 16 -38 0 6.5 -38 -.25 -1.5 -38 -.25 6.5
  [3,16,-38,0,6.5,-38,-.25,-1.5,-38,-.25,6.5],
// 3 16 -38 0 6.5 -38 -.25 -2.6 -38 -.25 -1.5
  [3,16,-38,0,6.5,-38,-.25,-2.6,-38,-.25,-1.5],
// 4 16 -38 0 6.5 -38 0 -6.5 -38 -.25 -5.4 -38 -.25 -2.6
  [4,16,-38,0,6.5,-38,0,-6.5,-38,-.25,-5.4,-38,-.25,-2.6],
// 3 16 -38 0 -6.5 -38 -.25 -6.5 -38 -.25 -5.4
  [3,16,-38,0,-6.5,-38,-.25,-6.5,-38,-.25,-5.4],
// 3 16 38 0 6.5 38 -.25 6.5 38 -.25 -2.6
  [3,16,38,0,6.5,38,-.25,6.5,38,-.25,-2.6],
// 4 16 38 0 6.5 38 -.25 -2.6 38 -.25 -5.4 38 0 -6.5
  [4,16,38,0,6.5,38,-.25,-2.6,38,-.25,-5.4,38,0,-6.5],
// 3 16 38 0 -6.5 38 -.25 -5.4 38 -.25 -6.5
  [3,16,38,0,-6.5,38,-.25,-5.4,38,-.25,-6.5],
// 3 16 -36.5 0 -8 22.7 -.25 -8 -36.5 -.25 -8
  [3,16,-36.5,0,-8,22.7,-.25,-8,-36.5,-.25,-8],
// 4 16 -36.5 0 -8 36.5 0 -8 36.5 -.25 -8 22.7 -.25 -8
  [4,16,-36.5,0,-8,36.5,0,-8,36.5,-.25,-8,22.7,-.25,-8],
// 0 // Top faces
// 0 // Black faces
// 4 0 38 -.25 6.5 36.5 -.25 8 18.25 -.25 8 14 -.25 0
  [4,0,38,-.25,6.5,36.5,-.25,8,18.25,-.25,8,14,-.25,0],
// 3 0 38 -.25 6.5 14 -.25 0 15.6313 -.25 -1.5
  [3,0,38,-.25,6.5,14,-.25,0,15.6313,-.25,-1.5],
// 4 0 38 -.25 6.5 15.6313 -.25 -1.5 16.8725 -.25 -2.6 38 -.25 -2.6
  [4,0,38,-.25,6.5,15.6313,-.25,-1.5,16.8725,-.25,-2.6,38,-.25,-2.6],
// 4 0 38 -.25 -6.5 38 -.25 -5.4 19.8725 -.25 -5.4 22.7 -.25 -8
  [4,0,38,-.25,-6.5,38,-.25,-5.4,19.8725,-.25,-5.4,22.7,-.25,-8],
// 3 0 38 -.25 -6.5 22.7 -.25 -8 36.5 -.25 -8
  [3,0,38,-.25,-6.5,22.7,-.25,-8,36.5,-.25,-8],
// 0 // Grey faces
// 4 71 16.8725 -.25 -2.6 15.6313 -.25 -1.5 -38 -.25 -1.5 -38 -.25 -2.6
  [4,71,16.8725,-.25,-2.6,15.6313,-.25,-1.5,-38,-.25,-1.5,-38,-.25,-2.6],
// 3 71 19.8725 -.25 -5.4 -38 -.25 -5.4 -38 -.25 -6.5
  [3,71,19.8725,-.25,-5.4,-38,-.25,-5.4,-38,-.25,-6.5],
// 4 71 19.8725 -.25 -5.4 -38 -.25 -6.5 -36.5 -.25 -8 22.7 -.25 -8
  [4,71,19.8725,-.25,-5.4,-38,-.25,-6.5,-36.5,-.25,-8,22.7,-.25,-8],
// 0 // Red faces
// 4 4 -38 -.25 -2.6 -38 -.25 -5.4 19.8725 -.25 -5.4 16.8725 -.25 -2.6
  [4,4,-38,-.25,-2.6,-38,-.25,-5.4,19.8725,-.25,-5.4,16.8725,-.25,-2.6],
// 4 4 38 -.25 -2.6 16.8725 -.25 -2.6 19.8725 -.25 -5.4 38 -.25 -5.4
  [4,4,38,-.25,-2.6,16.8725,-.25,-2.6,19.8725,-.25,-5.4,38,-.25,-5.4],
// 0 // White faces
// 4 15 -38 -.25 6.5 -38 -.25 -1.5 15.6313 -.25 -1.5 14 -.25 0
  [4,15,-38,-.25,6.5,-38,-.25,-1.5,15.6313,-.25,-1.5,14,-.25,0],
// 4 15 -38 -.25 6.5 14 -.25 0 18.25 -.25 8 -36.5 -.25 8
  [4,15,-38,-.25,6.5,14,-.25,0,18.25,-.25,8,-36.5,-.25,8],
];
module ldraw_lib__6142275f(step=0, col=false, unit=2/5, alt=false, line=0.2, solid=!$preview)
    makepoly(ldraw_lib__6142275f(), step=step, col=col, unit=unit, alt=alt, line=line, solid=solid);
ldraw_lib__6142275f(line=0.2);
// file: s/2431s01.scad
use <../../lib.scad>
use <../../p/box4.scad>
use <../../p/box5.scad>
use <../../p/stud3.scad>
function ldraw_lib__s__2431s01() = [
// 0 ~Tile  1 x  4 with Groove without Top Face
// 0 Name: s\2431s01.dat
// 0 Author: Santeri Piippo [arezey]
// 0 !LDRAW_ORG Subpart UPDATE 2010-02
// 0 !LICENSE Licensed under CC BY 2.0 and CC BY 4.0 : see CAreadme.txt
// 
// 0 BFC CERTIFY CCW
  [0,"BFC","CERTIFY"],
  [0,"BFC","CCW"],
// 
// 0 !HISTORY 2010-07-05 [PTadmin] Official Update 2010-02
// 
// 
// 1 16 0 0 0 40 0 0 0 7 0 0 0 10 box4.dat
  [1,16,0,0,0,40,0,0,0,7,0,0,0,10, ldraw_lib__box4()],
// 1 16 0 7 0 39 0 0 0 1 0 0 0 9 box4.dat
  [1,16,0,7,0,39,0,0,0,1,0,0,0,9, ldraw_lib__box4()],
// 0 BFC INVERTNEXT
  [0,"BFC","INVERTNEXT"],
// 1 16 0 8 0 36 0 0 0 -4 0 0 0 6 box5.dat
  [1,16,0,8,0,36,0,0,0,-4,0,0,0,6, ldraw_lib__box5()],
// 4 16 -39 8 9 -36 8 6 -36 8 -6 -39 8 -9
  [4,16,-39,8,9,-36,8,6,-36,8,-6,-39,8,-9],
// 4 16 39 8 -9 36 8 -6 36 8 6 39 8 9
  [4,16,39,8,-9,36,8,-6,36,8,6,39,8,9],
// 4 16 39 8 9 36 8 6 -36 8 6 -39 8 9
  [4,16,39,8,9,36,8,6,-36,8,6,-39,8,9],
// 4 16 -39 8 -9 -36 8 -6 36 8 -6 39 8 -9
  [4,16,-39,8,-9,-36,8,-6,36,8,-6,39,8,-9],
// 4 16 -40 7 10 -39 7 9 -39 7 -9 -40 7 -10
  [4,16,-40,7,10,-39,7,9,-39,7,-9,-40,7,-10],
// 4 16 40 7 -10 39 7 -9 39 7 9 40 7 10
  [4,16,40,7,-10,39,7,-9,39,7,9,40,7,10],
// 4 16 40 7 10 39 7 9 -39 7 9 -40 7 10
  [4,16,40,7,10,39,7,9,-39,7,9,-40,7,10],
// 4 16 -40 7 -10 -39 7 -9 39 7 -9 40 7 -10
  [4,16,-40,7,-10,-39,7,-9,39,7,-9,40,7,-10],
// 1 16 0 4 0 1 0 0 0 -1 0 0 0 1 stud3.dat
  [1,16,0,4,0,1,0,0,0,-1,0,0,0,1, ldraw_lib__stud3()],
// 1 16 -20 4 0 1 0 0 0 -1 0 0 0 1 stud3.dat
  [1,16,-20,4,0,1,0,0,0,-1,0,0,0,1, ldraw_lib__stud3()],
// 1 16 20 4 0 1 0 0 0 -1 0 0 0 1 stud3.dat
  [1,16,20,4,0,1,0,0,0,-1,0,0,0,1, ldraw_lib__stud3()],
// 0 //
];
makepoly(ldraw_lib__s__2431s01(), line=0.2);
// file: 6142275y.scad
use <../lib.scad>
use <6142275f.scad>
function ldraw_lib__6142275y() = [
// 0 Sticker  0.8 x  3.8 with Red Line on Black, Grey and White Background Left
// 0 Name: 6142275y.dat
// 0 Author: Massimo Maso [Sirio]
// 0 !LDRAW_ORG Part UPDATE 2022-06
// 0 !LICENSE Licensed under CC BY 4.0 : see CAreadme.txt
// 
// 0 BFC CERTIFY CCW
  [0,"BFC","CERTIFY"],
  [0,"BFC","CCW"],
// 
// 0 !KEYWORDS Audi, e-tron, quattro, R18, Set 75872, Speed Champions
// 
// 0 !HISTORY 2022-12-20 [PTadmin] Official Update 2022-06
// 
// 
// 1 16 0 0 0 -1 0 0 0 1 0 0 0 1 6142275f.dat
  [1,16,0,0,0,-1,0,0,0,1,0,0,0,1, ldraw_lib__6142275f()],
];
module ldraw_lib__6142275y(step=0, col=false, unit=2/5, alt=false, line=0.2, solid=!$preview)
    makepoly(ldraw_lib__6142275y(), step=step, col=col, unit=unit, alt=alt, line=line, solid=solid);
ldraw_lib__6142275y(line=0.2);
// file: 2431.scad
use <../lib.scad>
use <s/2431s01.scad>
function ldraw_lib__2431() = [
// 0 Tile  1 x  4 with Groove
// 0 Name: 2431.dat
// 0 Author: Santeri Piippo [arezey]
// 0 !LDRAW_ORG Part UPDATE 2010-02
// 0 !LICENSE Licensed under CC BY 2.0 and CC BY 4.0 : see CAreadme.txt
// 
// 0 BFC CERTIFY CCW
  [0,"BFC","CERTIFY"],
  [0,"BFC","CCW"],
// 
// 0 !HISTORY 2010-07-05 [PTadmin] Official Update 2010-02
// 
// 
// 1 16 0 0 0 1 0 0 0 1 0 0 0 1 s\2431s01.dat
  [1,16,0,0,0,1,0,0,0,1,0,0,0,1, ldraw_lib__s__2431s01()],
// 4 16 40 0 -10 40 0 10 -40 0 10 -40 0 -10
  [4,16,40,0,-10,40,0,10,-40,0,10,-40,0,-10],
// 0 //
];
makepoly(ldraw_lib__2431(), line=0.2);
// main file
use <../lib.scad>
use <2431.scad>
use <6142275y.scad>
function ldraw_lib__2431d0t() = [
// 0 Tile  1 x  4 with Red Line on Black, Grey and White Background Left Sticker
// 0 Name: 2431d0t.dat
// 0 Author: Vincent Messenet [Cheenzo]
// 0 !LDRAW_ORG Shortcut UPDATE 2026-05
// 0 !LICENSE Licensed under CC BY 4.0 : see CAreadme.txt
// 
// 0 BFC CERTIFY CCW
  [0,"BFC","CERTIFY"],
  [0,"BFC","CCW"],
// 
// 0 !CATEGORY Sticker Shortcut
// 
// 0 !KEYWORDS Bricklink 2431pb0807L, Set 75872
// 
// 0 !HISTORY 2026-05-31 [OrionP] Official Update 2026-05
// 
// 1 16 0 0 0 1 0 0 0 1 0 0 0 1 2431.dat
  [1,16,0,0,0,1,0,0,0,1,0,0,0,1, ldraw_lib__2431()],
// 1 16 0 0 0 1 0 0 0 1 0 0 0 1 6142275y.dat
  [1,16,0,0,0,1,0,0,0,1,0,0,0,1, ldraw_lib__6142275y()],
];
module ldraw_lib__2431d0t(step=0, col=false, unit=2/5, alt=false, line=0.2, solid=!$preview)
    makepoly(ldraw_lib__2431d0t(), step=step, col=col, unit=unit, alt=alt, line=line, solid=solid);
ldraw_lib__2431d0t(line=0.2);
